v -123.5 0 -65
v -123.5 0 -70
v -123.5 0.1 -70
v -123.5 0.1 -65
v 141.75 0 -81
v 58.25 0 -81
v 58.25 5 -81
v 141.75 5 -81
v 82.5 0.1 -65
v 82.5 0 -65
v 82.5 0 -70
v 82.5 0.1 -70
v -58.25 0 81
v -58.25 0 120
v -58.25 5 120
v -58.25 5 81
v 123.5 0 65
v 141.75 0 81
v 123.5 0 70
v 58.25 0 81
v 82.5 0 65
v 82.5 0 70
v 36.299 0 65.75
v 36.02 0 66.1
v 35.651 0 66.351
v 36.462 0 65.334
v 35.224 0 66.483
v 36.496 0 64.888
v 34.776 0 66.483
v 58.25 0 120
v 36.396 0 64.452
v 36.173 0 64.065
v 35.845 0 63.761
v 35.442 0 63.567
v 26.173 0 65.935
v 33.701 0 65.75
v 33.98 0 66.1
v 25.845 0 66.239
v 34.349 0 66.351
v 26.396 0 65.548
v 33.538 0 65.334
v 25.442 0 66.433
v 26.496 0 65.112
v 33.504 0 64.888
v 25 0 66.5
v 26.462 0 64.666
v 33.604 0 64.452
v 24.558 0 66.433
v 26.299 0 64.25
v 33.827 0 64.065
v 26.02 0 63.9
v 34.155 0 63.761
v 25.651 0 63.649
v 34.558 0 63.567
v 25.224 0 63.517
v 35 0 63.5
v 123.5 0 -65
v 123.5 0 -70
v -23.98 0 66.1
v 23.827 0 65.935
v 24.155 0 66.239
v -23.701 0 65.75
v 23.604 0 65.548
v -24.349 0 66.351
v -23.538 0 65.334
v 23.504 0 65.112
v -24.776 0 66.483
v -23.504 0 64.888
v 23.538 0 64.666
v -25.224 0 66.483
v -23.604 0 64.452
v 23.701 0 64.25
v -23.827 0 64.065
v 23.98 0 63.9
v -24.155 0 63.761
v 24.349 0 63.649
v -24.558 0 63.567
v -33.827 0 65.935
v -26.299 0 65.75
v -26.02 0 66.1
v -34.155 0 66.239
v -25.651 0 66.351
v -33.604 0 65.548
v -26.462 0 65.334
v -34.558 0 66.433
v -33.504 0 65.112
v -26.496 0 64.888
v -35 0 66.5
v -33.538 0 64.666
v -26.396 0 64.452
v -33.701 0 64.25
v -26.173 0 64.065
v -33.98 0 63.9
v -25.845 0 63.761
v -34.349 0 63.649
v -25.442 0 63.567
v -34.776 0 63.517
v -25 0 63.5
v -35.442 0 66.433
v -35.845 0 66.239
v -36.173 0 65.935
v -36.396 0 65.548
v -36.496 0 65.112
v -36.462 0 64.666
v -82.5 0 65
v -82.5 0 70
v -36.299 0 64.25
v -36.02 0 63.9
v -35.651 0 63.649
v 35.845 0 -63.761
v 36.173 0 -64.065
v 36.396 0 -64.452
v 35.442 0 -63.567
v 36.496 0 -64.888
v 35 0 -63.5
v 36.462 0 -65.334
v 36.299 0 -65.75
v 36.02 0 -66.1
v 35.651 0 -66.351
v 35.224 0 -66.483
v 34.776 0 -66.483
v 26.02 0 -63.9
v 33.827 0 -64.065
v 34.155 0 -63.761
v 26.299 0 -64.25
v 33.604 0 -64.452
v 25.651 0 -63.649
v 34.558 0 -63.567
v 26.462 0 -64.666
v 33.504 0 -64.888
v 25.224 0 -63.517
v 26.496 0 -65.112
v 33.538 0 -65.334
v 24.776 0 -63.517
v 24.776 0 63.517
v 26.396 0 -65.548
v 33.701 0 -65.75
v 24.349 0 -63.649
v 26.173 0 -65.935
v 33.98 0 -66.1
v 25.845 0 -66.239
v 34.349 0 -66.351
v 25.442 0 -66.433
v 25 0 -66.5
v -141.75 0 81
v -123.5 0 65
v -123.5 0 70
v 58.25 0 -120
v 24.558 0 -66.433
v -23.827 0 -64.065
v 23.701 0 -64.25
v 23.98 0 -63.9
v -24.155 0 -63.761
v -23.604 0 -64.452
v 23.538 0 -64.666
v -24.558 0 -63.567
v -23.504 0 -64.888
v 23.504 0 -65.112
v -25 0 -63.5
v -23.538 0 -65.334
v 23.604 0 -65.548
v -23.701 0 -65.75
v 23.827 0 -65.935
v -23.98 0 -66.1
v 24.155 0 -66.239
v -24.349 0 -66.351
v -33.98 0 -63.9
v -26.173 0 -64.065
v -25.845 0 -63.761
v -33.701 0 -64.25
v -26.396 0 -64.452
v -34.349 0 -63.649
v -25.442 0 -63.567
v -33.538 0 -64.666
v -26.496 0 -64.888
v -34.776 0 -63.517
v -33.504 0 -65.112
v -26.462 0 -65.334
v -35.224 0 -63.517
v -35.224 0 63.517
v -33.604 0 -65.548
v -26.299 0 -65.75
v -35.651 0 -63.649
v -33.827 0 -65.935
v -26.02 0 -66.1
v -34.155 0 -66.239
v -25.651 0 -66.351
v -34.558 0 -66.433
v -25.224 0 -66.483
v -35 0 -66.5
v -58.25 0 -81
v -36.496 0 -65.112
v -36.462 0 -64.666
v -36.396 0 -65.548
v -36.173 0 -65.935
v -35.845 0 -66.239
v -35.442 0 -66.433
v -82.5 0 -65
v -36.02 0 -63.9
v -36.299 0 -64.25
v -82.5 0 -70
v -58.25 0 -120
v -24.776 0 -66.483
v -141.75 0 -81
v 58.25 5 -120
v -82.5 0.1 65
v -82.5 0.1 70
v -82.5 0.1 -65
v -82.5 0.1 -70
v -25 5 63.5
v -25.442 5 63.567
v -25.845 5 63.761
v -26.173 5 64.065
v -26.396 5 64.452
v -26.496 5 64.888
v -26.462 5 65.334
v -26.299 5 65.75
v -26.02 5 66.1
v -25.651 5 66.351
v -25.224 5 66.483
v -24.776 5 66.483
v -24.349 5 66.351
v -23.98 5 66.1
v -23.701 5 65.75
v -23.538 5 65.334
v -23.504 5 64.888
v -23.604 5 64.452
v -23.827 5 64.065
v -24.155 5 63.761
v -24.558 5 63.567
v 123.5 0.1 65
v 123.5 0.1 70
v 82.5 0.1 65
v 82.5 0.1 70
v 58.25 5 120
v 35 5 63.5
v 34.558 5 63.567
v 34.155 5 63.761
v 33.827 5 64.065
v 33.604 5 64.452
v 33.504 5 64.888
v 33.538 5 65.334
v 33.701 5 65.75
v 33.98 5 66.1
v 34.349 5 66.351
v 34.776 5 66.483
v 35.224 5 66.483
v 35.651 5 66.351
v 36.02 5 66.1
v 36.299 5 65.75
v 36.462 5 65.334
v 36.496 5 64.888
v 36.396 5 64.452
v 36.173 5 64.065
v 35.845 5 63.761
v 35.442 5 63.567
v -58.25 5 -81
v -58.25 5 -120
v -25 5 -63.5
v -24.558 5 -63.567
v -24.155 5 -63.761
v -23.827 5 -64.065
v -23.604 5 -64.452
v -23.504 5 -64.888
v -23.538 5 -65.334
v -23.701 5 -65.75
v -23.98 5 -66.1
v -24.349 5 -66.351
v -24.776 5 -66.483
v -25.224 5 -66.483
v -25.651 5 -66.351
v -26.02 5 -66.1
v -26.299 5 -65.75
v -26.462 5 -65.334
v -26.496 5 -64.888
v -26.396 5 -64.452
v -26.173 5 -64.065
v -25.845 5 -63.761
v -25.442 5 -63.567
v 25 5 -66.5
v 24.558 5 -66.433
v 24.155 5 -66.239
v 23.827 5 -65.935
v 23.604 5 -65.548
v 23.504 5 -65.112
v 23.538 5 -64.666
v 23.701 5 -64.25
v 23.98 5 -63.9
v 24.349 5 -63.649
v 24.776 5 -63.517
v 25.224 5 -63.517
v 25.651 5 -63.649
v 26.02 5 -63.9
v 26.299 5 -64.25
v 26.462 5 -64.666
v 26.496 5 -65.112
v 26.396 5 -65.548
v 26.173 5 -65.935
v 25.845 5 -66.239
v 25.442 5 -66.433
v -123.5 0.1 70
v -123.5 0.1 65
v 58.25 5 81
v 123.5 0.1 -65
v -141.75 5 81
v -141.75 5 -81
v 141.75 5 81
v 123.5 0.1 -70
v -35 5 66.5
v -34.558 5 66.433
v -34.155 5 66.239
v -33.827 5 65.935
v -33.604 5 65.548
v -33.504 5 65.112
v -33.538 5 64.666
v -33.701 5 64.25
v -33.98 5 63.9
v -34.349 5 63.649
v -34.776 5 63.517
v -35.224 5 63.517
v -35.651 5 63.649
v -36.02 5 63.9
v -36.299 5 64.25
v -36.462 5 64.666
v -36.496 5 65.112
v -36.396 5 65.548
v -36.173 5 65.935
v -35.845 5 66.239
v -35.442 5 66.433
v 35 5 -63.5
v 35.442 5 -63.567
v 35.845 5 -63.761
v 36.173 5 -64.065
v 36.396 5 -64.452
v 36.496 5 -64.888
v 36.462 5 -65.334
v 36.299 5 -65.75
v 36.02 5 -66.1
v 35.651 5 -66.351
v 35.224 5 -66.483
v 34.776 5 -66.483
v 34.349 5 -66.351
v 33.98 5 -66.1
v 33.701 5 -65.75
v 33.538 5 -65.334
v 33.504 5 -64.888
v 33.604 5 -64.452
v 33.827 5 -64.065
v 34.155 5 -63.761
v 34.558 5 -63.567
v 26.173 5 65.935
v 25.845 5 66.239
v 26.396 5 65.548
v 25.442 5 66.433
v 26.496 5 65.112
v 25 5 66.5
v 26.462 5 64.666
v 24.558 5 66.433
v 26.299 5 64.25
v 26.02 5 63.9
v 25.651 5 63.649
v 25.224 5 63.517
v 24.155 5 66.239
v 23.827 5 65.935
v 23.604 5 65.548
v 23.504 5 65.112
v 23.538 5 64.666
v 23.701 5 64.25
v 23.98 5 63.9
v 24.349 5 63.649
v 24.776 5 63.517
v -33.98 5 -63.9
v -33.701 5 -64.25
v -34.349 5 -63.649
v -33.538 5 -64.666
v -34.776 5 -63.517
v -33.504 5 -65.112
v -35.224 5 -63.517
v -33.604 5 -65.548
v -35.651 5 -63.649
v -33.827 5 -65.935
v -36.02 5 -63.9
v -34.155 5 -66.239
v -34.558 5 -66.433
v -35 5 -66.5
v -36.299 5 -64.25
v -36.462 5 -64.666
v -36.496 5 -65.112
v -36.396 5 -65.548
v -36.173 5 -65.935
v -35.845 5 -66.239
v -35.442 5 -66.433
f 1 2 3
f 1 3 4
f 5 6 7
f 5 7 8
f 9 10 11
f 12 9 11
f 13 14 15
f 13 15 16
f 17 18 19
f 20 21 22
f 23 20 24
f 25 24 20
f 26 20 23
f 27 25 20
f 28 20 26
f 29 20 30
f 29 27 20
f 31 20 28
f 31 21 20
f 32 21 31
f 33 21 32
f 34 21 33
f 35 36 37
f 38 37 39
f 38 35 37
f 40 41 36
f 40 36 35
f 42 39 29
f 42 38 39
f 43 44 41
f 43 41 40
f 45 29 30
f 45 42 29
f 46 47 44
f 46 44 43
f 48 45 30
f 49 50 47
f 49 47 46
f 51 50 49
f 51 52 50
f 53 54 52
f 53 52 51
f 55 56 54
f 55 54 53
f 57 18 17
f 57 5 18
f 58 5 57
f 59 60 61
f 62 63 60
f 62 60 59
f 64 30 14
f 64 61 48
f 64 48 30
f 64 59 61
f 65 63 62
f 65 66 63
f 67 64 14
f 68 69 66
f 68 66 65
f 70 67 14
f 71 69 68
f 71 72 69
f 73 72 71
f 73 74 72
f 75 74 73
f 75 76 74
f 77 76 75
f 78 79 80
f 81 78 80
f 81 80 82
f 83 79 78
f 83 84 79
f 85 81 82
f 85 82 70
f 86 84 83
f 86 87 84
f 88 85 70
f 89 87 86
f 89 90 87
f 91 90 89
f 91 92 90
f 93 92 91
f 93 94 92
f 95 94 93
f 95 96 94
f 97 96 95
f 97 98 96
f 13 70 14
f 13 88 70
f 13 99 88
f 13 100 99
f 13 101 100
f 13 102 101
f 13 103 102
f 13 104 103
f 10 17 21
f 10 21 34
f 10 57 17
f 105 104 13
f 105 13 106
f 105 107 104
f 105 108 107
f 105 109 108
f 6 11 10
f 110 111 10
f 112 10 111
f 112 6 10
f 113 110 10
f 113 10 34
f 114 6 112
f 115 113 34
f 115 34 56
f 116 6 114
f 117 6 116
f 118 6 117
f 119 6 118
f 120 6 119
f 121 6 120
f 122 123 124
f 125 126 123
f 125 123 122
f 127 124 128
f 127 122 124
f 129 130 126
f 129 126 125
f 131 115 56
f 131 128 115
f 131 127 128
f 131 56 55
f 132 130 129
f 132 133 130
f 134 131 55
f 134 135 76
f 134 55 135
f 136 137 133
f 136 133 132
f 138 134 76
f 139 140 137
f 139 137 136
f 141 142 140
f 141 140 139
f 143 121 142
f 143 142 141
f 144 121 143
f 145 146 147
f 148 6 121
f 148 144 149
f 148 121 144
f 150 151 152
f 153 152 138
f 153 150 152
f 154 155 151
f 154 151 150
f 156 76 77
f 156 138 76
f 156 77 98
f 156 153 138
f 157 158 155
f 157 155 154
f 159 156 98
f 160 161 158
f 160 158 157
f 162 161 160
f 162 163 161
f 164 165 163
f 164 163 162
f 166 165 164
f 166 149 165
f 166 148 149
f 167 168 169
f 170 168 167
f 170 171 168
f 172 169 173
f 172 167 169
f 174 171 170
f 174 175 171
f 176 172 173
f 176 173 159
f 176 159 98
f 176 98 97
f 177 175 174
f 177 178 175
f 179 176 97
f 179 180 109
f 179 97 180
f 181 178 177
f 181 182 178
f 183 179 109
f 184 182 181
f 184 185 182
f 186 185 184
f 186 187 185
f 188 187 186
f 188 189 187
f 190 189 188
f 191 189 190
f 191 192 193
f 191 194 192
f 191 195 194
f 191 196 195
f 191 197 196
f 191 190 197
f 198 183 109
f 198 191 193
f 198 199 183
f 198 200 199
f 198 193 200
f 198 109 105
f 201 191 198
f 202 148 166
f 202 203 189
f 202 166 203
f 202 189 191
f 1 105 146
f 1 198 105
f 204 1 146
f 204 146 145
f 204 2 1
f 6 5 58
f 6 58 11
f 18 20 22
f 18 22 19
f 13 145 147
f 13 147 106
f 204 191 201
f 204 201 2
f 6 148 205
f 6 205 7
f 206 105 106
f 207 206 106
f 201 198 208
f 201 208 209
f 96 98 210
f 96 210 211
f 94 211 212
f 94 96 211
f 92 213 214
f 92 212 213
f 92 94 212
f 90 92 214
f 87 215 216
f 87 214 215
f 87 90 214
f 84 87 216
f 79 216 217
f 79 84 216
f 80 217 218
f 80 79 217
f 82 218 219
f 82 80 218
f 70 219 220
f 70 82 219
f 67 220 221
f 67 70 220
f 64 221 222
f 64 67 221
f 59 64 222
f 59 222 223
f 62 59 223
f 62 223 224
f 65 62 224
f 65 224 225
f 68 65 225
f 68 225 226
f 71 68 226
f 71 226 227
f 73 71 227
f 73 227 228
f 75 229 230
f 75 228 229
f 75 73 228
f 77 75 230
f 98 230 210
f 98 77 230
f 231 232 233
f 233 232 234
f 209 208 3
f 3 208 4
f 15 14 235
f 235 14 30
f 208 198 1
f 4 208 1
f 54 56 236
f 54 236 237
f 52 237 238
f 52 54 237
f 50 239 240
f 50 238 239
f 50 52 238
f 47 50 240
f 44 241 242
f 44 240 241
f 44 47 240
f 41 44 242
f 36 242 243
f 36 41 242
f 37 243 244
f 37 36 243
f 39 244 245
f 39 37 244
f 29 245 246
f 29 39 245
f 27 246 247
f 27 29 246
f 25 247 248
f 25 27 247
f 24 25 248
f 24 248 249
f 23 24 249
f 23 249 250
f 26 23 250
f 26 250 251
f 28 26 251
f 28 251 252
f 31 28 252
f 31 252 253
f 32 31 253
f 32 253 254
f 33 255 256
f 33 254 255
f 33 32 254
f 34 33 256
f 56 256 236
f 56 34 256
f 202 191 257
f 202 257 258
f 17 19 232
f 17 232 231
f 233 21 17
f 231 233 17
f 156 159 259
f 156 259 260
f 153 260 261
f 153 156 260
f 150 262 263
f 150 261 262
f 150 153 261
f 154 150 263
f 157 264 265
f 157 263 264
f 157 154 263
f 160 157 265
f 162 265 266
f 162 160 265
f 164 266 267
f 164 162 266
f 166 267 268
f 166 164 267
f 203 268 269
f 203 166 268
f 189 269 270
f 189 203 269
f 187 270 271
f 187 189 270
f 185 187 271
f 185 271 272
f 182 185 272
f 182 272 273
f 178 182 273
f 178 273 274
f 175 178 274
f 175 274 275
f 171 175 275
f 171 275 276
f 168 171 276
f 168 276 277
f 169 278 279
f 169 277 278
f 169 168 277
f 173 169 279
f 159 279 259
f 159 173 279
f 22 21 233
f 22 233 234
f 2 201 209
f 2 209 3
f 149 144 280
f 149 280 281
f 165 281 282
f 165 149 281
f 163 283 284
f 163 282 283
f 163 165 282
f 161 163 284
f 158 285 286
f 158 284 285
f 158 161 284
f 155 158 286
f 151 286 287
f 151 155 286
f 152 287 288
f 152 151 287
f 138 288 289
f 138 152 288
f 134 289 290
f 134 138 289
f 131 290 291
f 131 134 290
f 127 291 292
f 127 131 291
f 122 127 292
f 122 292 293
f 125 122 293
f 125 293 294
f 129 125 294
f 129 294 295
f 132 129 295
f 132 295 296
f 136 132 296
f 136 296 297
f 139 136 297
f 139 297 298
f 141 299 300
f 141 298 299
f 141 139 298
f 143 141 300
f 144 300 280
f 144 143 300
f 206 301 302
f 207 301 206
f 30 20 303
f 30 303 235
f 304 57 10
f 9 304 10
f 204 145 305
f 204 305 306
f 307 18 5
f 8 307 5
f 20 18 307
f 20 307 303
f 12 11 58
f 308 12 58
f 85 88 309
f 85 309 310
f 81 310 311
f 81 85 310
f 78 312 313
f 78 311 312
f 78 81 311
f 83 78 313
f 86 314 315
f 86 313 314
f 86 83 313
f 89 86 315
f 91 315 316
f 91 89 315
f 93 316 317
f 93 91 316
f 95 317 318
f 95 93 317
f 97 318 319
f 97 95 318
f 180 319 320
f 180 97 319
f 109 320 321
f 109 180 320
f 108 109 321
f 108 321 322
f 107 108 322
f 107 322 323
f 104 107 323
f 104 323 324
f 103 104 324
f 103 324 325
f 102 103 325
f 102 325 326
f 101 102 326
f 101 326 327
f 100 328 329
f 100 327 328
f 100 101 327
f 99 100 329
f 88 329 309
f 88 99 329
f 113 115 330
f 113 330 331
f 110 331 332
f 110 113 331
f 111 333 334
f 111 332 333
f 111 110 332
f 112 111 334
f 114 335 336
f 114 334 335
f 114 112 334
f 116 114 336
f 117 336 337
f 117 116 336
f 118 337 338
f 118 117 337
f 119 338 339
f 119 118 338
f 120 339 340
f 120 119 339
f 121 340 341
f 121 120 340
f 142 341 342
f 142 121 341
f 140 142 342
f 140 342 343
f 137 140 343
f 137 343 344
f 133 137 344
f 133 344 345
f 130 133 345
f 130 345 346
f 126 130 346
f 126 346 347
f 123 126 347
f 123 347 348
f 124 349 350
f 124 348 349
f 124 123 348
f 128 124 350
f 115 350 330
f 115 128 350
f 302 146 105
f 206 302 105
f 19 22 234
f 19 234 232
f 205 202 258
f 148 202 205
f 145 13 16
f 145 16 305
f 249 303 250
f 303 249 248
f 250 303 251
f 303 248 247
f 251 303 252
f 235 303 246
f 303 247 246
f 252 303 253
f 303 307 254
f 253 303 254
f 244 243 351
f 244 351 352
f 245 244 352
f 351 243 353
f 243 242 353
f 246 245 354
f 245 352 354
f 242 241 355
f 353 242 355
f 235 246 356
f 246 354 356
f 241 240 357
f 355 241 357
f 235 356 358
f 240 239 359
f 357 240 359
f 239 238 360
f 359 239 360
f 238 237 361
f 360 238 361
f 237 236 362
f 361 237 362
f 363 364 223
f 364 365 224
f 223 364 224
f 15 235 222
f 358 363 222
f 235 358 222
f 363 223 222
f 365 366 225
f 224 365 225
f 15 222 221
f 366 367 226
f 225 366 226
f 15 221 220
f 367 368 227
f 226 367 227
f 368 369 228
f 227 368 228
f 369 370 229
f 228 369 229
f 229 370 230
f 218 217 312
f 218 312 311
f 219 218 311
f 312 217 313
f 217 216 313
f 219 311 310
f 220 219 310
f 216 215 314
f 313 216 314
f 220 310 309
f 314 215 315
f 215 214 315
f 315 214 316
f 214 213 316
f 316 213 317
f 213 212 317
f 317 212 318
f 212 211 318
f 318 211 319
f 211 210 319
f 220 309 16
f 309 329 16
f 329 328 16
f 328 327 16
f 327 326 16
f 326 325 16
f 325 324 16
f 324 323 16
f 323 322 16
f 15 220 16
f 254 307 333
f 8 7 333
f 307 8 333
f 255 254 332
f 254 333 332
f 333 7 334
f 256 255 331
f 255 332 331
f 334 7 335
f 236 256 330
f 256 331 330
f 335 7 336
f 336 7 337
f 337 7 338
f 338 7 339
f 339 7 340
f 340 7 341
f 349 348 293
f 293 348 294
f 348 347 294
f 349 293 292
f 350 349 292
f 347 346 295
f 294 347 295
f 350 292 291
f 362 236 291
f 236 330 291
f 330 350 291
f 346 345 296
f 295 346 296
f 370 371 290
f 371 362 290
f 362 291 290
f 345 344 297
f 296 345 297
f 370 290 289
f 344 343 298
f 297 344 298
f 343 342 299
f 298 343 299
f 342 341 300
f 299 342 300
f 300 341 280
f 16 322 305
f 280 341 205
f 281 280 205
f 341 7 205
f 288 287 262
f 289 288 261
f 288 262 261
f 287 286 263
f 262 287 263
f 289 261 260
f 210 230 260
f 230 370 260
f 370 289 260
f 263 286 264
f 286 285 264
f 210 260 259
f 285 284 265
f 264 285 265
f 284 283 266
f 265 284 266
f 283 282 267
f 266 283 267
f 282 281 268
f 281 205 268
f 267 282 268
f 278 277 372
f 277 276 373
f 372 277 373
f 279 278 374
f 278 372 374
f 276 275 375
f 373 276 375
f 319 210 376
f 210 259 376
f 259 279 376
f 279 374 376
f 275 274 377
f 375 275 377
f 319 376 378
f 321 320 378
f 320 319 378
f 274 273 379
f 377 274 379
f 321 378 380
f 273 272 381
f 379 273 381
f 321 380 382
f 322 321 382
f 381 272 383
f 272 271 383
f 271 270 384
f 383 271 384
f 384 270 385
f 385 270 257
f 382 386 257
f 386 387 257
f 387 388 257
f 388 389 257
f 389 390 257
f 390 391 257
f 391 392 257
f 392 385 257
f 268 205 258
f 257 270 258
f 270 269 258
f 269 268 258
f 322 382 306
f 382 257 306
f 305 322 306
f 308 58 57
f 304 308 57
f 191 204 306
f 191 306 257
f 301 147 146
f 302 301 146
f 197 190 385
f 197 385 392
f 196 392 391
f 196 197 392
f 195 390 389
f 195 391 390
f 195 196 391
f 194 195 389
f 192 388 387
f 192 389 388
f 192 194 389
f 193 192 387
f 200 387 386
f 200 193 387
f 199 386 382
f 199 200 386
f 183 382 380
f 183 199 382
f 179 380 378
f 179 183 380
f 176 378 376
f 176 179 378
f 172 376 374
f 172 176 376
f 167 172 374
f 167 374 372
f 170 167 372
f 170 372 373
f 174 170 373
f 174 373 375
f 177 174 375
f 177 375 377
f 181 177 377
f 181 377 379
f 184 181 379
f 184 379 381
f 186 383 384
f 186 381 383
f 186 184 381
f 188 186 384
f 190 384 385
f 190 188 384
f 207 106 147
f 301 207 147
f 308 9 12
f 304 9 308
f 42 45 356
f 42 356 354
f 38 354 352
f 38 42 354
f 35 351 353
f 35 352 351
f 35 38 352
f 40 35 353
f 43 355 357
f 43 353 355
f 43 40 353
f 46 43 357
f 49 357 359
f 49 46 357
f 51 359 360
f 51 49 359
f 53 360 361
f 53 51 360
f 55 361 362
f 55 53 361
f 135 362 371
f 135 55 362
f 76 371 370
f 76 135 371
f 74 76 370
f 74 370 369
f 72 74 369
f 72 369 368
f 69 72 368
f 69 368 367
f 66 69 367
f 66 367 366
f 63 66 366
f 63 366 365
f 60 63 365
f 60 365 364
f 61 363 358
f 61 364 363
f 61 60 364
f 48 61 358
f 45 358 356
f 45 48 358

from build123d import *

# Parameters (mm, degrees)
BOSS_EXTRUDE1_DEPTH     = 5
CUT_EXTRUDE1_DEPTH      = 0.1
CUT_EXTRUDE2_DEPTH      = 194.597682063
CUT_EXTRUDE2_DEPTH_BACK = 194.597682063
SKETCH3_W               = 6
SKETCH3_H               = 162
SKETCH3_W_2             = 116.5
SKETCH3_H_2             = 5
CUT_EXTRUDE4_DEPTH      = 186.790372463
CUT_EXTRUDE4_DEPTH_BACK = 186.790372463
SKETCH7_R               = 1.5


with BuildPart() as part:
    # Sketch1 → Boss-Extrude1 (new body)
    with BuildSketch(Plane(origin=(0, 0, 0), x_dir=(1, 0, 0), z_dir=(0, 1, 0))):
        Polygon((-58.25, 125), (58.25, 125), (58.25, 81), (147.75, 81), (147.75, -81), (58.25, -81), (58.25, -125), (-58.25, -125), (-58.25, -81), (-147.75, -81), (-147.75, 81), (-58.25, 81), align=None)
    extrude(amount=BOSS_EXTRUDE1_DEPTH)

    # Sketch2 → Cut-Extrude1 (cut)
    with BuildSketch(Plane.XZ):
        Polygon((-103, 65), (-82.5, 65), (-82.5, 70), (-123.5, 70), (-123.5, 65), align=None)
        Polygon((123.5, 70), (123.5, 65), (103, 65), (82.5, 65), (82.5, 70), align=None)
        Polygon((-123.5, -70), (-123.5, -65), (-103, -65), (-82.5, -65), (-82.5, -70), align=None)
        Polygon((82.5, -70), (123.5, -70), (123.5, -65), (103, -65), (82.5, -65), align=None)
    extrude(amount=-CUT_EXTRUDE1_DEPTH, mode=Mode.SUBTRACT)

    # Sketch3 → Cut-Extrude2 (cut, two sides: drawn at the far end of the back side and taken through both)
    with BuildSketch(Plane(origin=(0, 5, 0), x_dir=(1, 0, 0), z_dir=(0, 1, 0)).offset(-CUT_EXTRUDE2_DEPTH_BACK)):
        with Locations((-144.75, 0)):
            Rectangle(SKETCH3_W, SKETCH3_H)
        with Locations((144.75, 0)):
            Rectangle(SKETCH3_W, SKETCH3_H)
        with Locations((0, 122.5)):
            Rectangle(SKETCH3_W_2, SKETCH3_H_2)
        with Locations((0, -122.5)):
            Rectangle(SKETCH3_W_2, SKETCH3_H_2)
    extrude(amount=CUT_EXTRUDE2_DEPTH + CUT_EXTRUDE2_DEPTH_BACK, mode=Mode.SUBTRACT)

    # Sketch7 → Cut-Extrude4 (cut, two sides: drawn at the far end of the back side and taken through both)
    with BuildSketch(Plane(origin=(0, 5, 0), x_dir=(1, 0, 0), z_dir=(0, 1, 0)).offset(-CUT_EXTRUDE4_DEPTH_BACK)):
        with Locations(Location((25, -65, 0), (0, 0, 270))):
            Circle(SKETCH7_R)
        with Locations(Location((35, -65, 0), (0, 0, 90))):
            Circle(SKETCH7_R)
        with Locations(Location((-35, -65, 0), (0, 0, 270))):
            Circle(SKETCH7_R)
        with Locations(Location((-25, -65, 0), (0, 0, 90))):
            Circle(SKETCH7_R)
        with Locations(Location((-25, 65, 0), (0, 0, 270))):
            Circle(SKETCH7_R)
        with Locations(Location((-35, 65, 0), (0, 0, 90))):
            Circle(SKETCH7_R)
        with Locations(Location((35, 65, 0), (0, 0, 270))):
            Circle(SKETCH7_R)
        with Locations(Location((25, 65, 0), (0, 0, 90))):
            Circle(SKETCH7_R)
    extrude(amount=CUT_EXTRUDE4_DEPTH + CUT_EXTRUDE4_DEPTH_BACK, mode=Mode.SUBTRACT)


solid = part.part
